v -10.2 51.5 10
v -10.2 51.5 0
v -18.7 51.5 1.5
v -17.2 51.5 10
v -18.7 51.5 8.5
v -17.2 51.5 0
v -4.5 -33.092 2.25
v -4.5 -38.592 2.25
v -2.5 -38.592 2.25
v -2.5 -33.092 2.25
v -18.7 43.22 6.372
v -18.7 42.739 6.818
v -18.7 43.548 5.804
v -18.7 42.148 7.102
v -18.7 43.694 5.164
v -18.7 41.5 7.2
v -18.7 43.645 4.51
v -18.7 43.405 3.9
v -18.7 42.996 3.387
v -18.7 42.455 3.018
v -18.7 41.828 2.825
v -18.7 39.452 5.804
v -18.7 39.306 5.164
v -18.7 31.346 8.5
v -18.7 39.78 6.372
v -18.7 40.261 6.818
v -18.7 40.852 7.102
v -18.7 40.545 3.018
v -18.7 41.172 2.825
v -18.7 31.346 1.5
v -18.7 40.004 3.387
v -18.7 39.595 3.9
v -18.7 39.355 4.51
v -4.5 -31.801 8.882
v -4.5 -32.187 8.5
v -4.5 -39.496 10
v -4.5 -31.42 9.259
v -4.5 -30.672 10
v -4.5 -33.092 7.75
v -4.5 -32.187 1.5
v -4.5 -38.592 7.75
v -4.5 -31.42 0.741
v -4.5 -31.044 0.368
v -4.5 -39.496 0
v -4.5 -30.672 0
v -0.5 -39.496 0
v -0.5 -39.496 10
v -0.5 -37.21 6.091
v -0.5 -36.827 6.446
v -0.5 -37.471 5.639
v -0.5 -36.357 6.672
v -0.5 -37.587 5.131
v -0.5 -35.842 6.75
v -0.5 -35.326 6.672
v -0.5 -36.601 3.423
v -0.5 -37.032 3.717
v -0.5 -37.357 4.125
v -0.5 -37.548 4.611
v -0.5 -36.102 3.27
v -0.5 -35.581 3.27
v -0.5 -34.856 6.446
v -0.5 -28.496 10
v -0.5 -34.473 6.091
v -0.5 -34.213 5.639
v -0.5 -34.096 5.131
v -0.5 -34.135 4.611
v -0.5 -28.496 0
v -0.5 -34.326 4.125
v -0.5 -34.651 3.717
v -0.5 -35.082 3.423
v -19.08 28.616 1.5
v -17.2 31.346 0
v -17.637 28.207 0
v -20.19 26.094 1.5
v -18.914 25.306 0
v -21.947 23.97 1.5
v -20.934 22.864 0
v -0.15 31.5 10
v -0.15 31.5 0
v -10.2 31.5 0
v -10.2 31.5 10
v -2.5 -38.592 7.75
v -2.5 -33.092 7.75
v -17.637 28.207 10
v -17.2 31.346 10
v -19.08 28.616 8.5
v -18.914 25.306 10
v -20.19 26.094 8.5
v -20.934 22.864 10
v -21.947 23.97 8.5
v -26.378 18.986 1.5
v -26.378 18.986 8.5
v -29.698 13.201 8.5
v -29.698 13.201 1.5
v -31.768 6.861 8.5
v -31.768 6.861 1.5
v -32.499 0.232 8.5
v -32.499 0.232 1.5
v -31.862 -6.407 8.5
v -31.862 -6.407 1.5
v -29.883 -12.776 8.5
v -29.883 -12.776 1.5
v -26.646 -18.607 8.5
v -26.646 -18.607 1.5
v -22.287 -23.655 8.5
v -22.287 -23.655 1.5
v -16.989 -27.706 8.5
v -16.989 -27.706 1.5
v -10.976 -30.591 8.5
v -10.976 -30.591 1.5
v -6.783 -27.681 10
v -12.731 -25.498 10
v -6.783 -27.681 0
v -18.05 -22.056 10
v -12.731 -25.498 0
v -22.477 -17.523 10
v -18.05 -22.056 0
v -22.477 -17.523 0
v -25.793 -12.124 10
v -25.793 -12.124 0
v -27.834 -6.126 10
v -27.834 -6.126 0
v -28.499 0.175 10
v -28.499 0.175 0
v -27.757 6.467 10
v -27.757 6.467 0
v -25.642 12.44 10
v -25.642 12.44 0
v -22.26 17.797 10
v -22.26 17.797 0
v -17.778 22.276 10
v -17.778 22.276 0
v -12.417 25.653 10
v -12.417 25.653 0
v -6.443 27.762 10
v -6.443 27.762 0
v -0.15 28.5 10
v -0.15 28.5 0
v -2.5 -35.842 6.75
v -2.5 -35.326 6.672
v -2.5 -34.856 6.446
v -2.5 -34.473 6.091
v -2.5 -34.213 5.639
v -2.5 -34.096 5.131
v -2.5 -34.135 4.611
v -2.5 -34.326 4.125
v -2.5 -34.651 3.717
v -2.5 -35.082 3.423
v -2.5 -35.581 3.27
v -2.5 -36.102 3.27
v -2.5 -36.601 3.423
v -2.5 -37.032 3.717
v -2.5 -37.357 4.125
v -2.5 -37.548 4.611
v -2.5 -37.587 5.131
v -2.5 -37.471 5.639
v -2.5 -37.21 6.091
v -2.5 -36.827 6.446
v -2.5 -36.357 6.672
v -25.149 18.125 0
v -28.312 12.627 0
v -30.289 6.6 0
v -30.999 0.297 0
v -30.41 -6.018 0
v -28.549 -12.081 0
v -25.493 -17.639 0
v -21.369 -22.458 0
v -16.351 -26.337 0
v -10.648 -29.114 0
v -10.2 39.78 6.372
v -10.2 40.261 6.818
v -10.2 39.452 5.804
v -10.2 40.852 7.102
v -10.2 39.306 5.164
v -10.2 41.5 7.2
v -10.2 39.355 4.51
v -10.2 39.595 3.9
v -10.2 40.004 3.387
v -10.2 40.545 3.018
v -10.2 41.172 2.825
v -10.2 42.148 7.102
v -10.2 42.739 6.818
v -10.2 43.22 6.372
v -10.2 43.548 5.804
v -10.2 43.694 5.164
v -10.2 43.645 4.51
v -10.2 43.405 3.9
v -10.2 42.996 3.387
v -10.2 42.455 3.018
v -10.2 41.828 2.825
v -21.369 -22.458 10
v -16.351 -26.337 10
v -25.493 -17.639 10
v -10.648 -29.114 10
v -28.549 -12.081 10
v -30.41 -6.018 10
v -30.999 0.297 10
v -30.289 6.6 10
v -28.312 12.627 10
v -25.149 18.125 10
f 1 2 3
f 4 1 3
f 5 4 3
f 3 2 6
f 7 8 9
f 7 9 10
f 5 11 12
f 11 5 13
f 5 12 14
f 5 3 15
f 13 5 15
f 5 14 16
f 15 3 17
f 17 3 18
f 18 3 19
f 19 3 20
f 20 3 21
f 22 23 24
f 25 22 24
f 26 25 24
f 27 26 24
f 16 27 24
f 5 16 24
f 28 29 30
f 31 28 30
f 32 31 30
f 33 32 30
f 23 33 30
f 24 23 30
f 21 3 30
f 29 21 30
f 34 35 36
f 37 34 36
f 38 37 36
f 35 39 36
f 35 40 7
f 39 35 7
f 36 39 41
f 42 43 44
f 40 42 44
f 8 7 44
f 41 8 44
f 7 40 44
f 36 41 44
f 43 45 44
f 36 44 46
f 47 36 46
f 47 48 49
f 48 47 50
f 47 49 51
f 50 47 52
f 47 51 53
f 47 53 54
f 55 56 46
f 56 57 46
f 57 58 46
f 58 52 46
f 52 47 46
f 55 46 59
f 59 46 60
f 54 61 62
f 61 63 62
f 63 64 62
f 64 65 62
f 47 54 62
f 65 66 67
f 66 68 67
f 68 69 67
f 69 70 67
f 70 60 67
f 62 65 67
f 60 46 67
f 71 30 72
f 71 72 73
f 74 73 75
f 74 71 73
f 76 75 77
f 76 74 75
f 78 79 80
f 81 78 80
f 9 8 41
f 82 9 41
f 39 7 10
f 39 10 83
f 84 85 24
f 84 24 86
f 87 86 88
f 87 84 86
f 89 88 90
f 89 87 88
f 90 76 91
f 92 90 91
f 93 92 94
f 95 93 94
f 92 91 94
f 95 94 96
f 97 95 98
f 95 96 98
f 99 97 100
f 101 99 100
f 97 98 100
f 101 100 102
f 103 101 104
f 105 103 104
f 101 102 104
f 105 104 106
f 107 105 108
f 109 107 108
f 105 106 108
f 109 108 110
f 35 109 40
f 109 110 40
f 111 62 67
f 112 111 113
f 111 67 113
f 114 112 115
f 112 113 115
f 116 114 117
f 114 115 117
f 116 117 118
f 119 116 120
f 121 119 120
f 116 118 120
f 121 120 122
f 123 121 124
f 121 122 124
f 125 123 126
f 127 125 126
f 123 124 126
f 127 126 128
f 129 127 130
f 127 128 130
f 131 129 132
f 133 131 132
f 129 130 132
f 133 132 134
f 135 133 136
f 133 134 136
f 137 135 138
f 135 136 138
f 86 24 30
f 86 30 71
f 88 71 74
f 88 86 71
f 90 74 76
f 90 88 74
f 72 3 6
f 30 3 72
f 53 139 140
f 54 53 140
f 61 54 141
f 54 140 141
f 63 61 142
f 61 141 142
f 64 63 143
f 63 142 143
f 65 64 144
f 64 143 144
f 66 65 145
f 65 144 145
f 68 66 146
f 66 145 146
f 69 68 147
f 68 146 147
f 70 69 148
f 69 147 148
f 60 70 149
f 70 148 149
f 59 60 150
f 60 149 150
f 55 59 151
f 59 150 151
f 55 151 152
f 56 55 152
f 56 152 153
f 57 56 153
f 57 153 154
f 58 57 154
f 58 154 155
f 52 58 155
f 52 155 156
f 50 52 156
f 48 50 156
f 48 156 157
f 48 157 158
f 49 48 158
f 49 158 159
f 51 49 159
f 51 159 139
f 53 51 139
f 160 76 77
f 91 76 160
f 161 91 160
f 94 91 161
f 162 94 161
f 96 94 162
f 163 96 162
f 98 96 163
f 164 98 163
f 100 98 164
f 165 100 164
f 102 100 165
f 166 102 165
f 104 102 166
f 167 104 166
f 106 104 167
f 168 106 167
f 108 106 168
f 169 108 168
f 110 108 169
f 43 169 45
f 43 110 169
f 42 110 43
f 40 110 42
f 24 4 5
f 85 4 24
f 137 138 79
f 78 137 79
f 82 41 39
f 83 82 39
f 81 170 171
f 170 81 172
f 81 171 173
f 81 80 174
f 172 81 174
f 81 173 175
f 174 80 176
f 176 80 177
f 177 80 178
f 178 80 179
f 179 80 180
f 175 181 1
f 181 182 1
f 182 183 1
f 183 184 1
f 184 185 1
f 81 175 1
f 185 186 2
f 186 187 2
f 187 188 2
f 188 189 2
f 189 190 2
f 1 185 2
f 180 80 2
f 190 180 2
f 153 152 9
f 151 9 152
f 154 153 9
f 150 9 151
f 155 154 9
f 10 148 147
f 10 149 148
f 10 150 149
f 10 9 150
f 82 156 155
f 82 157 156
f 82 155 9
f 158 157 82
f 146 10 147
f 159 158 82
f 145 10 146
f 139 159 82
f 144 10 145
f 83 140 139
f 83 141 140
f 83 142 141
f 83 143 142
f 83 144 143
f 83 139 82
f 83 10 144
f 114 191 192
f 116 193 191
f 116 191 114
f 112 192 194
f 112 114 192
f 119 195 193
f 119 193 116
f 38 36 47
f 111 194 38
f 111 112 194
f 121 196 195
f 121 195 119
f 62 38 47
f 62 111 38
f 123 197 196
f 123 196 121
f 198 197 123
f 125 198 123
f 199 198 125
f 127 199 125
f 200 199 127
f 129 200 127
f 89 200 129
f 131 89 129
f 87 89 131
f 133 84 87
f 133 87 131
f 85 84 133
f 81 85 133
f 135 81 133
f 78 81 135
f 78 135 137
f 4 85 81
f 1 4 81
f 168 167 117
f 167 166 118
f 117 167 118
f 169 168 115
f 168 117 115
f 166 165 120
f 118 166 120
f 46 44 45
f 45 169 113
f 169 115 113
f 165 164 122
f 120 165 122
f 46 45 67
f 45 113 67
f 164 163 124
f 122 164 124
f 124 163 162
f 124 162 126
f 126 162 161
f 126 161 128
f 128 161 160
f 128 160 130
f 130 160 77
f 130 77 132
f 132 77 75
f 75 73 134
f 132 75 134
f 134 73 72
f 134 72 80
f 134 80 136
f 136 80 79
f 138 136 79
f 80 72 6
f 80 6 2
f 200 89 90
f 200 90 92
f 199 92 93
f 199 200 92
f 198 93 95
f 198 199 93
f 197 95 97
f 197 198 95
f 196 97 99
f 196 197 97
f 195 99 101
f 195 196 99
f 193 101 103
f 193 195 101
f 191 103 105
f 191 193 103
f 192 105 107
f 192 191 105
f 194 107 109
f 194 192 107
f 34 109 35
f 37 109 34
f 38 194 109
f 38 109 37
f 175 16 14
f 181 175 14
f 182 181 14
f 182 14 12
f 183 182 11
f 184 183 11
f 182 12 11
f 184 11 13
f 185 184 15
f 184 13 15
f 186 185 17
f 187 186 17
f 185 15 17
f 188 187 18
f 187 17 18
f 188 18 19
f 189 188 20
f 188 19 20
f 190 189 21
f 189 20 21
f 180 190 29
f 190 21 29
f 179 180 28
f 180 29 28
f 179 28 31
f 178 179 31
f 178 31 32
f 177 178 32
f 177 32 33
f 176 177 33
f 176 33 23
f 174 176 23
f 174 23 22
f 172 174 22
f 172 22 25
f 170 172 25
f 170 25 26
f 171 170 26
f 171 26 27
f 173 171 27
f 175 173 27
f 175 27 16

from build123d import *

# Parameters (mm, degrees)
AUFSATZ_LINEAR_AUSTRAGEN1_DEPTH = 10
SKIZZE2_R                       = 1.75
SCHNITT_LINEAR_AUSTRAGEN1_DEPTH = 38
SKIZZE4_R                       = 2.2
SCHNITT_LINEAR_AUSTRAGEN3_DEPTH = 52.2
VERRUNDUNG1_R                   = 10
SKIZZE5_W                       = 5.5
SKIZZE5_H                       = 5.5
SCHNITT_LINEAR_AUSTRAGEN4_DEPTH = 2
FASE1_SIZE                      = 1.5
SCHNITT_LINEAR_AUSTRAGEN5_DEPTH = 11


with BuildPart() as part:
    # Skizze1 → Aufsatz-Linear austragen1 (new body)
    with BuildSketch(Plane.XY):
        with BuildLine():
            Line((0.5, -28.495613698), (0.5, -32.496153619))
            Line((0.5, -32.496153619), (0.5, -39.496153619))
            Line((0.5, -39.496153619), (4.5, -39.496153619))
            Line((4.5, -39.496153619), (4.5, -32.186953879))
            ThreePointArc((4.5, -32.186953879), (31.590882714, -7.633225356), (18.7, 26.581196361))
            Line((18.7, 26.581196361), (18.7, 51.5))
            Line((18.7, 51.5), (10.2, 51.5))
            Line((10.2, 51.5), (10.2, 31.5))
            Line((10.2, 31.5), (-10.2, 31.5))
            Line((-10.2, 31.5), (-10.2, 51.5))
            Line((-10.2, 51.5), (-18.7, 51.5))
            Line((-18.7, 51.5), (-18.7, 26.581196361))
            ThreePointArc((-18.7, 26.581196361), (-31.590882714, -7.633225356), (-4.5, -32.186953879))
            Line((-4.5, -32.186953879), (-4.5, -39.496153619))
            Line((-4.5, -39.496153619), (-0.5, -39.496153619))
            Line((-0.5, -39.496153619), (-0.5, -32.496153619))
            Line((-0.5, -32.496153619), (-0.5, -28.495613698))
            ThreePointArc((-0.5, -28.495613698), (0, 28.5), (0.5, -28.495613698))
        make_face()
    extrude(amount=AUFSATZ_LINEAR_AUSTRAGEN1_DEPTH)

    # Skizze2 → Schnitt-Linear austragen1 (cut, through all)
    with BuildSketch(Plane.ZY.offset(4.5)):
        with Locations((5, -35.841553749)):
            Circle(SKIZZE2_R)
    extrude(amount=-SCHNITT_LINEAR_AUSTRAGEN1_DEPTH, mode=Mode.SUBTRACT)

    # Skizze4 → Schnitt-Linear austragen3 (cut, through all)
    with BuildSketch(Plane.ZY.offset(18.7)):
        with Locations((5, 41.5)):
            Circle(SKIZZE4_R)
    extrude(amount=-SCHNITT_LINEAR_AUSTRAGEN3_DEPTH, mode=Mode.SUBTRACT)

    # Verrundung1
    verrundung1_edges = [part.edges().sort_by_distance(p)[0] for p in [
        (-18.7, 26.581196361, 5),
        (18.7, 26.581196361, 5),
    ]]
    fillet(verrundung1_edges, radius=VERRUNDUNG1_R)

    # Skizze5 → Schnitt-Linear austragen4 (cut)
    with BuildSketch(Plane.ZY.offset(4.5)):
        with Locations((5, -35.841553749)):
            Rectangle(SKIZZE5_W, SKIZZE5_H)
    extrude(amount=-SCHNITT_LINEAR_AUSTRAGEN4_DEPTH, mode=Mode.SUBTRACT)

    # Fase1
    fase1_edges = [part.edges().sort_by_distance(p)[0] for p in [
        (-18.7, 41.422906559, 0),
        (31.036620275, -9.642520517, 0),
        (-18.7, 41.422906559, 10),
        (18.7, 41.422906559, 0),
        (18.7, 41.422906559, 10),
        (31.036620275, -9.642520517, 10),
        (-31.036620275, -9.642520517, 0),
        (-31.036620275, -9.642520517, 10),
        (19.547693958, 27.316508696, 0),
        (19.547693958, 27.316508696, 10),
        (-19.547693958, 27.316508696, 0),
        (-19.547693958, 27.316508696, 10),
    ]]
    chamfer(fase1_edges, length=FASE1_SIZE)

    # Skizze6 → Schnitt-Linear austragen5 (cut, through all)
    with BuildSketch(Plane.XY):
        Polygon((0, -80.065943577), (0, 27.478555263), (-0.15, 27.478555263), (-0.15, 32.428870792), (0, 32.428870792), (0, 80.065943577), (51.694887104, 80.065943577), (51.694887104, -72.979708266), align=None)
    extrude(amount=SCHNITT_LINEAR_AUSTRAGEN5_DEPTH, mode=Mode.SUBTRACT)


solid = part.part
